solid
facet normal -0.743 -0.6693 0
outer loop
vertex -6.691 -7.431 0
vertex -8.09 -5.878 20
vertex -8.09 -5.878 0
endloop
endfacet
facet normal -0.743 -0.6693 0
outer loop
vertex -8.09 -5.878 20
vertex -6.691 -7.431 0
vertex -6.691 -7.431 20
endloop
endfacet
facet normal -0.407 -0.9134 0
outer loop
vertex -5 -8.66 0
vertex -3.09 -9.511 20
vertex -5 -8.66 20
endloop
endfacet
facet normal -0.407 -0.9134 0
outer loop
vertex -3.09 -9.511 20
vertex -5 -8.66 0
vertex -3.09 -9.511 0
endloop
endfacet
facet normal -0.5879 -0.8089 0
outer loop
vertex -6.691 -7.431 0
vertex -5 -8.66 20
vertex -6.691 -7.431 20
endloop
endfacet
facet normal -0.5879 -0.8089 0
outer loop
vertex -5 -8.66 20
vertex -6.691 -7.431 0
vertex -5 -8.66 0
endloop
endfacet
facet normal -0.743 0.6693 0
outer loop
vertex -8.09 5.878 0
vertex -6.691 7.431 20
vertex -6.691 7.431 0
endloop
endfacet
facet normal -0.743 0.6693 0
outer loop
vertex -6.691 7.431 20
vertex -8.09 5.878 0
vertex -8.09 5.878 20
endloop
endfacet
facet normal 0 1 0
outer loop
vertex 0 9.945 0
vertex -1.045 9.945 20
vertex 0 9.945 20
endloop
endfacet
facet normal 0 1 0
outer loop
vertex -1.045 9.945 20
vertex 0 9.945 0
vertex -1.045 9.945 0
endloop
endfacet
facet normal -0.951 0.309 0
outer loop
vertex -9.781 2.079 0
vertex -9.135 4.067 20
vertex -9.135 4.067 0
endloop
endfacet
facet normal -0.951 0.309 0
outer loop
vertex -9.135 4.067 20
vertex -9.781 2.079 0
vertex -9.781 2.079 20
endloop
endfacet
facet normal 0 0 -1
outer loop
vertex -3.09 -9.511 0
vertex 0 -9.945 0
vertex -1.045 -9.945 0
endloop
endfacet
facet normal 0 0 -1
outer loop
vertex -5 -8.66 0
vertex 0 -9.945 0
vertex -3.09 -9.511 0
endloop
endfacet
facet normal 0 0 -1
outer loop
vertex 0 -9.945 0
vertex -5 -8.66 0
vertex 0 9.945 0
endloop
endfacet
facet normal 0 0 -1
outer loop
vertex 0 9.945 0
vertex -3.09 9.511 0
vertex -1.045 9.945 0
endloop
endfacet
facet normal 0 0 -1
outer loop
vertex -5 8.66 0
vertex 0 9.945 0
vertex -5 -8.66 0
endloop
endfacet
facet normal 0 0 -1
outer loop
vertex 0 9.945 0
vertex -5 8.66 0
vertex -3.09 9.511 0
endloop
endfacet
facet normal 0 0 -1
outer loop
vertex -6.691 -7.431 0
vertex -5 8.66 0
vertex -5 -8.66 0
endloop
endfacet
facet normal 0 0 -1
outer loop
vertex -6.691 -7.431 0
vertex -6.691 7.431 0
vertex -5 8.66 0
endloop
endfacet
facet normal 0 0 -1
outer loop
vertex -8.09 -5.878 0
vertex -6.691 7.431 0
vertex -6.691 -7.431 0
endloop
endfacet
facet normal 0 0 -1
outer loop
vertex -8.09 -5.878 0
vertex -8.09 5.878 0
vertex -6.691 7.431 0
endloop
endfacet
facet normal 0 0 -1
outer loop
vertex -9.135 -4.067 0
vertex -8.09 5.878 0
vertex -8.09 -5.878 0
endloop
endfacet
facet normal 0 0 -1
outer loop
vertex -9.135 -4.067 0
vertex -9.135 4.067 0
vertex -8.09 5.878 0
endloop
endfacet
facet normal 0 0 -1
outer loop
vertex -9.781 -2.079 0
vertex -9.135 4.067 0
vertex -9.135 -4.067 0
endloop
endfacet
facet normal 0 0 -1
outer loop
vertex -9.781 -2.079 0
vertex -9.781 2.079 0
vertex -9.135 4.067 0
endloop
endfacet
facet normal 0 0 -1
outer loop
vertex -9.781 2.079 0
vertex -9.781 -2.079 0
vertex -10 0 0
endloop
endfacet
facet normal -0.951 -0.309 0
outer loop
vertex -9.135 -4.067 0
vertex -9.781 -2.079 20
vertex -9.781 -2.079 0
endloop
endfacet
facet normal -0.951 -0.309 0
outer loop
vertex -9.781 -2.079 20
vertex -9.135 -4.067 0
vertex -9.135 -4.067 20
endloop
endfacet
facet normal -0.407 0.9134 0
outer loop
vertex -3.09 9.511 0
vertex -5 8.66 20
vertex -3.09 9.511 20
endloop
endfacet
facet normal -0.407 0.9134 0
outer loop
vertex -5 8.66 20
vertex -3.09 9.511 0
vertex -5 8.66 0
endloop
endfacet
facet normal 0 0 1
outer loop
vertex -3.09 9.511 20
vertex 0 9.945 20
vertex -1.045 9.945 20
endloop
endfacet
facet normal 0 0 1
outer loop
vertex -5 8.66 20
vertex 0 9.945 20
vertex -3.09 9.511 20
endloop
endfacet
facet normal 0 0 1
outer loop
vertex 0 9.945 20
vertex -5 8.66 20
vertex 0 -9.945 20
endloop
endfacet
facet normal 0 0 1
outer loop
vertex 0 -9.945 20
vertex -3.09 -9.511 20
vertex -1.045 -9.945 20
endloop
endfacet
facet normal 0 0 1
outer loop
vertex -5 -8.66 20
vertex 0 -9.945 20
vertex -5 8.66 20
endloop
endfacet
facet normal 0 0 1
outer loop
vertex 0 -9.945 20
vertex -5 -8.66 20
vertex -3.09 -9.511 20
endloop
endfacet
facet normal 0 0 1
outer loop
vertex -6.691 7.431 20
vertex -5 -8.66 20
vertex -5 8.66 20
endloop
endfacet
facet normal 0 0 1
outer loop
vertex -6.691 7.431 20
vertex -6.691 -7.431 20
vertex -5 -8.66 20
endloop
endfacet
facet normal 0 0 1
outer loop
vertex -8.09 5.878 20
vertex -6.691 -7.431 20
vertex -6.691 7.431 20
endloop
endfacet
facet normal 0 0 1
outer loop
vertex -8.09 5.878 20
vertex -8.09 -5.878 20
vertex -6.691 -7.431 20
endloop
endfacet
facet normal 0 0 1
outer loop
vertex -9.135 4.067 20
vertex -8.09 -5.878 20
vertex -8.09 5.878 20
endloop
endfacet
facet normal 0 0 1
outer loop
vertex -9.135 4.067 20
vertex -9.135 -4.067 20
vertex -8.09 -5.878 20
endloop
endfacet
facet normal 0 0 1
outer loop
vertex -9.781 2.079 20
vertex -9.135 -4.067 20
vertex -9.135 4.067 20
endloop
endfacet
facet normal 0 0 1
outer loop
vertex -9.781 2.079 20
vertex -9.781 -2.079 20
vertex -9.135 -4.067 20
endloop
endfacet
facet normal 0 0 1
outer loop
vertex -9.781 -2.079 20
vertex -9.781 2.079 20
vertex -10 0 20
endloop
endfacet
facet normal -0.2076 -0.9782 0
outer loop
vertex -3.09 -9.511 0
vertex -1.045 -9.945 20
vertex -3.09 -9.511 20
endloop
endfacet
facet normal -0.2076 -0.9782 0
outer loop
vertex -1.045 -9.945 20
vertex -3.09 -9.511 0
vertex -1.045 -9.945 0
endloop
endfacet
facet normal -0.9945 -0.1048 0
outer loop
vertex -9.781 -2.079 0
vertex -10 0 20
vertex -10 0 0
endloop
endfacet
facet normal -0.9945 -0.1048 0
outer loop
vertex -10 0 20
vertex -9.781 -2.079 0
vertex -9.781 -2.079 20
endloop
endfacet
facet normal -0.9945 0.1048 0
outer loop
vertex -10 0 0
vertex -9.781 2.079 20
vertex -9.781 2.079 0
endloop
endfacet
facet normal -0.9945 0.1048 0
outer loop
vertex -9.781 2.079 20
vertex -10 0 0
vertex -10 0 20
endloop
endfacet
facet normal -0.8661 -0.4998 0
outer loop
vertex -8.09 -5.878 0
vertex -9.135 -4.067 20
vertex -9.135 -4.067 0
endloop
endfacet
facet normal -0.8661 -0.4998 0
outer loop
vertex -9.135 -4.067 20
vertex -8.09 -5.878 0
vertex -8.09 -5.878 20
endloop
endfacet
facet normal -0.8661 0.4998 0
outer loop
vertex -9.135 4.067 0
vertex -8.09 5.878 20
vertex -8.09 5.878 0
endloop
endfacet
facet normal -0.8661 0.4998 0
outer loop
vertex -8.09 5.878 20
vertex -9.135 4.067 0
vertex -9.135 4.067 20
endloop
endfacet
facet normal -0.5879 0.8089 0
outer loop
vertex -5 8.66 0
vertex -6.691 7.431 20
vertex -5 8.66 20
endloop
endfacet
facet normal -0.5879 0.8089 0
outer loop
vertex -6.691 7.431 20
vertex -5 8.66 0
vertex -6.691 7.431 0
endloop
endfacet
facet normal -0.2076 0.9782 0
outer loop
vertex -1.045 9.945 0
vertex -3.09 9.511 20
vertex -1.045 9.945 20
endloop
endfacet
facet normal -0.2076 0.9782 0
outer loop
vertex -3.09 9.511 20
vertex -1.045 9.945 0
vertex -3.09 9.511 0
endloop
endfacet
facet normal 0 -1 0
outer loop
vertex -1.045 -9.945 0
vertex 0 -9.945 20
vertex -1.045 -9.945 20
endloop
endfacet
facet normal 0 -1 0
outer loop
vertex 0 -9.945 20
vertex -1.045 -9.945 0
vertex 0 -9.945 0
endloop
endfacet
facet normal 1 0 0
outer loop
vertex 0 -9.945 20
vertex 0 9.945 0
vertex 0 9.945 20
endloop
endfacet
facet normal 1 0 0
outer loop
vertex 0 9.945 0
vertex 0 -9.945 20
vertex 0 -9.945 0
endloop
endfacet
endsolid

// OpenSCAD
// Example:
halfCylinder(
  z = 20,
  r = 10
);

module halfCylinder(
  z,
  r,
  mergeMargin = 1 // i.e. how much to overlap joined solids
) {
  difference() {
    // Cylinder itself:
    cylinder(z, r = r);
    // Cutoff part:
    translate([ 0, -r, -mergeMargin ])
    cube([ r, r * 2, z + mergeMargin * 2 ]);
  }
}
